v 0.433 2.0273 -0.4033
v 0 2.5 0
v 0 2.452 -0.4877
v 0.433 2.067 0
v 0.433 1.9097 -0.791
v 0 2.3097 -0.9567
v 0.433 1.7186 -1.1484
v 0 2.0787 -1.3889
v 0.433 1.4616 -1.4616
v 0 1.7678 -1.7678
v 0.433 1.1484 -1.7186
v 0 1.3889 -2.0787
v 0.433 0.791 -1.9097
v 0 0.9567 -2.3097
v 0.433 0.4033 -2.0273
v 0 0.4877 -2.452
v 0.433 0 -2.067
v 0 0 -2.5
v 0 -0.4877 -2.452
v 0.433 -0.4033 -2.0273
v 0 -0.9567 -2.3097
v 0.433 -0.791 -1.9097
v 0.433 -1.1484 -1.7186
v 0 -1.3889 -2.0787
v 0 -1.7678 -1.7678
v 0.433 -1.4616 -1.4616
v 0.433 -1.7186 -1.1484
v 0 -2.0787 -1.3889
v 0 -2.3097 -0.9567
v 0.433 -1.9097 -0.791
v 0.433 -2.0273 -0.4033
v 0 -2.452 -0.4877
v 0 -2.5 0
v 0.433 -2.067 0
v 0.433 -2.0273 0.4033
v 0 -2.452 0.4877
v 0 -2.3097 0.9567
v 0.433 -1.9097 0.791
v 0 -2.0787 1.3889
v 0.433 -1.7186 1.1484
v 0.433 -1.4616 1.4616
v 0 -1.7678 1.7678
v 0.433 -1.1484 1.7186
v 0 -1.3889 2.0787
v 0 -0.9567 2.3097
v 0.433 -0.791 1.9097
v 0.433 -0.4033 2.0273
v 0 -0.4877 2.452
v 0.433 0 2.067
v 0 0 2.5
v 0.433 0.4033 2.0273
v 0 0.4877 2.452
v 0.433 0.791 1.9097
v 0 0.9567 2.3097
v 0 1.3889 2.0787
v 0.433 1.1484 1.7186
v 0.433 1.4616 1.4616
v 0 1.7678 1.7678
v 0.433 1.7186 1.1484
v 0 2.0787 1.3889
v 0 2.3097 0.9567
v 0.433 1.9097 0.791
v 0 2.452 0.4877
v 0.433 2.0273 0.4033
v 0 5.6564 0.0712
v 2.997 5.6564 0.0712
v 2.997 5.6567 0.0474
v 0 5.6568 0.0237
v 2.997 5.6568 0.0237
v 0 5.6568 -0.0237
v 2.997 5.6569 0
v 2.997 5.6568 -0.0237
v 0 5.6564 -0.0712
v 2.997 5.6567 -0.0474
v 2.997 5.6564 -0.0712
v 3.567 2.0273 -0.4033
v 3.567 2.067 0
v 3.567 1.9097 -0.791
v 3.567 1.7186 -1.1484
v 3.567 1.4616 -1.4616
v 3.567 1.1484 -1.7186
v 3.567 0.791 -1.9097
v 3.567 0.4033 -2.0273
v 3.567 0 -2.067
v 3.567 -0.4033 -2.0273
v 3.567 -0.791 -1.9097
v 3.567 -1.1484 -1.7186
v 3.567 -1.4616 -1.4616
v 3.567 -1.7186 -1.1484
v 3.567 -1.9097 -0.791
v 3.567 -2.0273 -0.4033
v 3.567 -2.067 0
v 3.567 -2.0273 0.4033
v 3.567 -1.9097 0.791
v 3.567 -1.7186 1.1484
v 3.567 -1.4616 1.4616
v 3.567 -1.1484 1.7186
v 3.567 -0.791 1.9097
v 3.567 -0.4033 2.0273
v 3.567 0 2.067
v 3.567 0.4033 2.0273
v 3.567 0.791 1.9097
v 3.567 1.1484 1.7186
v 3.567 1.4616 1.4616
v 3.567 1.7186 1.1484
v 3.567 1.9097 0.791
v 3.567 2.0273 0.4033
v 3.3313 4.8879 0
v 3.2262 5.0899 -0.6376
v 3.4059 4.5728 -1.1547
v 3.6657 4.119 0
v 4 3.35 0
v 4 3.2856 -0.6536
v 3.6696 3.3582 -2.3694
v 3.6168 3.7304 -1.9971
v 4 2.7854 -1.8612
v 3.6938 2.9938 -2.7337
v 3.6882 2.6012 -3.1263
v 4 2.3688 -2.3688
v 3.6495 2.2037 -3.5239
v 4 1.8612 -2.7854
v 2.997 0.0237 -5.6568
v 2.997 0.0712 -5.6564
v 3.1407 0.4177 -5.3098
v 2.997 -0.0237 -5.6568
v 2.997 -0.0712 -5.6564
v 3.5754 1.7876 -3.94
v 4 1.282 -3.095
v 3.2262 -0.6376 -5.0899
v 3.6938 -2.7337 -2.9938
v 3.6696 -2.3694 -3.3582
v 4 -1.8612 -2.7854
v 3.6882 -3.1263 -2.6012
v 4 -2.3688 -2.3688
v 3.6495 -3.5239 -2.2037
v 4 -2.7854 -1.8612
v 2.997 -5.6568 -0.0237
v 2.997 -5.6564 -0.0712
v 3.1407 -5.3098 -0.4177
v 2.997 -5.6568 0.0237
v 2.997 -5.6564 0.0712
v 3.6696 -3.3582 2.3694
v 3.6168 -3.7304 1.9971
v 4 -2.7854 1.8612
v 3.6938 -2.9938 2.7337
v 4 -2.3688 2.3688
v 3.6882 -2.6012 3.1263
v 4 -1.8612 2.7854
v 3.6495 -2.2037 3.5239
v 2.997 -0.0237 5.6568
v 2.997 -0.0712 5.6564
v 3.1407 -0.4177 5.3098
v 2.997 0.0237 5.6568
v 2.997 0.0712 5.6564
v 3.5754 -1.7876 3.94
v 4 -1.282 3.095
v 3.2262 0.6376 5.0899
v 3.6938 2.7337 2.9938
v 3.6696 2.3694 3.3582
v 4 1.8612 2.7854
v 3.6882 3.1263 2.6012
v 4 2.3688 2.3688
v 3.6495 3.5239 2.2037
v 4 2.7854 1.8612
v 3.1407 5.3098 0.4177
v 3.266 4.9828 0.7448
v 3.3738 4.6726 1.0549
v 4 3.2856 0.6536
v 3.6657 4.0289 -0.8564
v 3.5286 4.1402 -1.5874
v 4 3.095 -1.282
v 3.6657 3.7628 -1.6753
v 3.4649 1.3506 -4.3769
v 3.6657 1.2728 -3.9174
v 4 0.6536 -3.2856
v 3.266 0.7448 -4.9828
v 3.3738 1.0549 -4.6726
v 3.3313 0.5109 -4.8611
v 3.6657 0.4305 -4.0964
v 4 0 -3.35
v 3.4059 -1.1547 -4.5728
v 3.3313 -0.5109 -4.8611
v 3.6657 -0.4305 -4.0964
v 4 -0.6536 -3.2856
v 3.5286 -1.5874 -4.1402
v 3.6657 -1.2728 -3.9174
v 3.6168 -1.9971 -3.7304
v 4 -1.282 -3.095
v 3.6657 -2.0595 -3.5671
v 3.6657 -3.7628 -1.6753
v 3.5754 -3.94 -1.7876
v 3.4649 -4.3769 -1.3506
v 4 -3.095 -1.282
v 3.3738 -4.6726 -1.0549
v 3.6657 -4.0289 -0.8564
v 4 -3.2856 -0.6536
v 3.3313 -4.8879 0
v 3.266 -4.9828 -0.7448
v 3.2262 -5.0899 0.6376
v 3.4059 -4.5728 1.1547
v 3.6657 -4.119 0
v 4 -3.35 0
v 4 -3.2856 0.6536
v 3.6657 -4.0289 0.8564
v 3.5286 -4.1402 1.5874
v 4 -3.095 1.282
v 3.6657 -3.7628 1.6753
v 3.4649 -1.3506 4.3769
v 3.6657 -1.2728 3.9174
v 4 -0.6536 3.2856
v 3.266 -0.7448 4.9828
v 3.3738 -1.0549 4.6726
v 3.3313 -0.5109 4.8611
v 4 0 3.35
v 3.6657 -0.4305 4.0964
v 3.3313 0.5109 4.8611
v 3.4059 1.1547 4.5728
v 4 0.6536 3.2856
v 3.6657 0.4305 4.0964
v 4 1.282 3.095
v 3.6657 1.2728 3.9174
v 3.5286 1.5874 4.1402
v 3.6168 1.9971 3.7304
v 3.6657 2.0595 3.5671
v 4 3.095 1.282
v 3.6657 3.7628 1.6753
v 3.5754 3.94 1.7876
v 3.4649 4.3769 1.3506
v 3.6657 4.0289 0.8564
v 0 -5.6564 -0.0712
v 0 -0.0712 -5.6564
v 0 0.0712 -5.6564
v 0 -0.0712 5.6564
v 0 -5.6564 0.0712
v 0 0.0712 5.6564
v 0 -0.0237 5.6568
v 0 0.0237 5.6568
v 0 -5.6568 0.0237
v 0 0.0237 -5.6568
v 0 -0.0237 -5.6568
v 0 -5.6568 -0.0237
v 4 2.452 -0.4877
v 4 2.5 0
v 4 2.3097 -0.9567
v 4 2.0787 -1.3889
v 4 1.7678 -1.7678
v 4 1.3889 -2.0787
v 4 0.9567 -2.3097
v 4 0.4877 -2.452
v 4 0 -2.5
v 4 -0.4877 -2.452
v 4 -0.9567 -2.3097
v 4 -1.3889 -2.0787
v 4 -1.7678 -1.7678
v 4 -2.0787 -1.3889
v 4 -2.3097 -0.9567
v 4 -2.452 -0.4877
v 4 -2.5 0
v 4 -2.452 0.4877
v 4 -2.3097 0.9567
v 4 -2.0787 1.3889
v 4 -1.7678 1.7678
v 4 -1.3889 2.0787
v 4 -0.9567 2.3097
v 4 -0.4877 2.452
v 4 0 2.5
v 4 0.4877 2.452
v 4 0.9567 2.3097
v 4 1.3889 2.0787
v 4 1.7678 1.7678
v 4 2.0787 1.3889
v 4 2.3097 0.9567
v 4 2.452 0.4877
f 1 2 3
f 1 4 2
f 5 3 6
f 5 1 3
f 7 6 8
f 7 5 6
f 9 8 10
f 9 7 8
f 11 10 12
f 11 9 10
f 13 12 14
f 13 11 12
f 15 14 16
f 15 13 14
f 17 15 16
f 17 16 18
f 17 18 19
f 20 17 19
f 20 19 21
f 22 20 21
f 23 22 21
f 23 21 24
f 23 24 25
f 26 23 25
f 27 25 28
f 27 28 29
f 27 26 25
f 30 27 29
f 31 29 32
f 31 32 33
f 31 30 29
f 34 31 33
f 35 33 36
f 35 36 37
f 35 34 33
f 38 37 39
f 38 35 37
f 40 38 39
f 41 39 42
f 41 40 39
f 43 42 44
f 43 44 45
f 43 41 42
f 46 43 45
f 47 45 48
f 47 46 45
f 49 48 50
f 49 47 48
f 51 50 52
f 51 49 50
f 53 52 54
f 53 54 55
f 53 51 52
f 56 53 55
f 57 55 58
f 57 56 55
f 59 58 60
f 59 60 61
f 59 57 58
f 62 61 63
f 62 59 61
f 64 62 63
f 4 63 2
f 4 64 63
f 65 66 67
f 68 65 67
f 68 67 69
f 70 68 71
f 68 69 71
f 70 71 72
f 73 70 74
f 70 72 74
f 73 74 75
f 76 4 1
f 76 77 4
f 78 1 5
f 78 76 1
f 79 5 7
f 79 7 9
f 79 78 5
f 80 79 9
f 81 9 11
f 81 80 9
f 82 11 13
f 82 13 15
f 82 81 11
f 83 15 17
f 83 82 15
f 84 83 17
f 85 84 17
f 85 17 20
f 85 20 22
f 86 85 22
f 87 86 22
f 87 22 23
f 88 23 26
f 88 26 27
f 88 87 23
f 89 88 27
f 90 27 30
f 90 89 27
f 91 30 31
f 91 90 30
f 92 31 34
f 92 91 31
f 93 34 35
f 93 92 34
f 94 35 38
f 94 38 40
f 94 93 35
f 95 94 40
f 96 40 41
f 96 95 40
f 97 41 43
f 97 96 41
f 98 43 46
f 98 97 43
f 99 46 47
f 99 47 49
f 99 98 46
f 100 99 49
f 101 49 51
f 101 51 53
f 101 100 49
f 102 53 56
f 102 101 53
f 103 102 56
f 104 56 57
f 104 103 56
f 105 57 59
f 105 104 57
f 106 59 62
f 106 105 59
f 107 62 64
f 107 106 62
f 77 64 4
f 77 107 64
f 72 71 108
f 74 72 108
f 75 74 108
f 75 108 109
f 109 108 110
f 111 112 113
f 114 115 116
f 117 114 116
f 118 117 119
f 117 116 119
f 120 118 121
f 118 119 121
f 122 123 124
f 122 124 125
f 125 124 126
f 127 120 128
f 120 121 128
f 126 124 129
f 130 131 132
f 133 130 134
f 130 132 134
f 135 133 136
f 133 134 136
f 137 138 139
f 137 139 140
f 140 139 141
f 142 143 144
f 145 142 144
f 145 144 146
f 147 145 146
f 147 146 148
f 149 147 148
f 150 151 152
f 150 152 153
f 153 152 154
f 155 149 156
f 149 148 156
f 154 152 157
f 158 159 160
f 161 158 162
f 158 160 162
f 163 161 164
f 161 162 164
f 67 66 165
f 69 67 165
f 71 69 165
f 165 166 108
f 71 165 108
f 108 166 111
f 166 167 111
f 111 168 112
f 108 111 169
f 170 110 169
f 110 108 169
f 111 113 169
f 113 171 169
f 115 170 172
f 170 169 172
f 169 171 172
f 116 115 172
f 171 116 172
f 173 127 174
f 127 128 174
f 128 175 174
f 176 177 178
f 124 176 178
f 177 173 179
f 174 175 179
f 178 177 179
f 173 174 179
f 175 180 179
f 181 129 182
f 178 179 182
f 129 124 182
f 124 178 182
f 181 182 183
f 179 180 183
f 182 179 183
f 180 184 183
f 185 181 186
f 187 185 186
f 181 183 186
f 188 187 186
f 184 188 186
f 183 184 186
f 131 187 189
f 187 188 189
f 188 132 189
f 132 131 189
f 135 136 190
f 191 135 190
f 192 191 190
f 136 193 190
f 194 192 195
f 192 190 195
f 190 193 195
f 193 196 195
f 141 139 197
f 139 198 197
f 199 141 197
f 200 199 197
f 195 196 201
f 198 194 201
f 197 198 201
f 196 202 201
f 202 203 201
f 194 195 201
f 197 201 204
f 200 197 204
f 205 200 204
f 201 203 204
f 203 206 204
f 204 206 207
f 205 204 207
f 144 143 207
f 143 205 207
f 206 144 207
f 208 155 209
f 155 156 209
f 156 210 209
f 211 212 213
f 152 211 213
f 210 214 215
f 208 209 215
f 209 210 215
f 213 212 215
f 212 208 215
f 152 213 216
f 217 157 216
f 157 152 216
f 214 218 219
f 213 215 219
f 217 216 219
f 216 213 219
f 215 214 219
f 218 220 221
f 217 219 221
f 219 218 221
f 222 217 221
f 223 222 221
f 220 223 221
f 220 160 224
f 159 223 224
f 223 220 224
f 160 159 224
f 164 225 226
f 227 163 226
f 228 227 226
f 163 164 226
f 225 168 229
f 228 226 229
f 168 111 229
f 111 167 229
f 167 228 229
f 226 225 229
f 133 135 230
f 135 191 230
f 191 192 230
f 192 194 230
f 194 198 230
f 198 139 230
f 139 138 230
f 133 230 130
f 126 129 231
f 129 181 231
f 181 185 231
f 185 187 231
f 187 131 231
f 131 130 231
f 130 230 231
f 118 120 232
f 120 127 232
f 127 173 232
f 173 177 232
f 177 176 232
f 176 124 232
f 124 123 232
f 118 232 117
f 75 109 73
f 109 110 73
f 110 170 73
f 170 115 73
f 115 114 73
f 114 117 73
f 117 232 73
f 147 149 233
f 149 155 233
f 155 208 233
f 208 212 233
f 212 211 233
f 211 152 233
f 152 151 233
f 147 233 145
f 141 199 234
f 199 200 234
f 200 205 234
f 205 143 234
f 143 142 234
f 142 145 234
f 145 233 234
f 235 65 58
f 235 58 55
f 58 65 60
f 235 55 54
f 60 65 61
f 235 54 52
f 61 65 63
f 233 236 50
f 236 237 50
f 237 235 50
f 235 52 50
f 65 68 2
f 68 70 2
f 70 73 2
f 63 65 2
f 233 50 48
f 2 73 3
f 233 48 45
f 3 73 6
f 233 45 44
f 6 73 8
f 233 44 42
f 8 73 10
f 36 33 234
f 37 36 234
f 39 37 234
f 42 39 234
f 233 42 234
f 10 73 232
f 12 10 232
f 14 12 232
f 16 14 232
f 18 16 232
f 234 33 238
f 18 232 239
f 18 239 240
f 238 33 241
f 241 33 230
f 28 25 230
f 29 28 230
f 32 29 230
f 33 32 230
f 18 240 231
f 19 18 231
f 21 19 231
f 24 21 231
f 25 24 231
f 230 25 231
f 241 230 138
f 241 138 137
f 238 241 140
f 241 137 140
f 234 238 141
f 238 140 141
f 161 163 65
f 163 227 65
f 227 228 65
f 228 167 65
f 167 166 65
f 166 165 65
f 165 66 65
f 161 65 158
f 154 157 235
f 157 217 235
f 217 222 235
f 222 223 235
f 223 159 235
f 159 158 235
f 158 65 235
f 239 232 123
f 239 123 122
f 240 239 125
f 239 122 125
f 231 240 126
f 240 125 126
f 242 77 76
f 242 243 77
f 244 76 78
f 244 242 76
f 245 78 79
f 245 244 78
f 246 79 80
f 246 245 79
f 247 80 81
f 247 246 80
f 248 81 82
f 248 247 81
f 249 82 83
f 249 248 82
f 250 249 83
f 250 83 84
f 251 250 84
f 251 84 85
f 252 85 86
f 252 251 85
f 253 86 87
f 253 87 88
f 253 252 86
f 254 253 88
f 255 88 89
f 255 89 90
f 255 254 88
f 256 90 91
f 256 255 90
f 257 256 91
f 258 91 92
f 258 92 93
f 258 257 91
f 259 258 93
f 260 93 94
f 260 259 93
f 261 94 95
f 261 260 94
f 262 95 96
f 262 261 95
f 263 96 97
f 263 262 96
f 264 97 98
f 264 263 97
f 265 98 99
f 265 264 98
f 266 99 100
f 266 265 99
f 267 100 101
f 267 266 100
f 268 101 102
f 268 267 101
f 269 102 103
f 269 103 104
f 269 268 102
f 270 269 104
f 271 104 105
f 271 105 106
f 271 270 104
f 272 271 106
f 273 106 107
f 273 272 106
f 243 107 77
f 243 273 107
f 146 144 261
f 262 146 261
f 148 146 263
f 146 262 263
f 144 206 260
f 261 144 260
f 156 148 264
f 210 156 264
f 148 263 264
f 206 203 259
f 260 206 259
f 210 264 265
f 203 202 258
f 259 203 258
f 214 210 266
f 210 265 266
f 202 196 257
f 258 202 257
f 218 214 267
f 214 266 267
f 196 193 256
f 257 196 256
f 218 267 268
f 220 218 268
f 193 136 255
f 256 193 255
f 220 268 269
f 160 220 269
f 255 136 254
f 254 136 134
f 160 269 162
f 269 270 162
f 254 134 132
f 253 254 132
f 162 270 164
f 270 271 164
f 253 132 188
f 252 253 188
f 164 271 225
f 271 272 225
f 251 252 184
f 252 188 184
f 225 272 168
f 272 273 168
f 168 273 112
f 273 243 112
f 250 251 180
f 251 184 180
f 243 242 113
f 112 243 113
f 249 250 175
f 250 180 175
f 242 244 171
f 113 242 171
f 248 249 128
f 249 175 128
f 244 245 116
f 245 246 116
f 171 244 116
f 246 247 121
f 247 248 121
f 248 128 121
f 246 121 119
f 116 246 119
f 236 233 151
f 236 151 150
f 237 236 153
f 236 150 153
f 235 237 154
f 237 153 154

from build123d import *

# Parameters (mm, degrees)
SKETCH2_W          = 32
SKETCH2_H          = 32
CUT_EXTRUDE1_DEPTH = 4


with BuildPart() as part:
    # Sketch1 → Revolve1 (revolve)
    with BuildSketch(Plane.XY):
        Polygon((0, 0), (0, 5.656854249), (2.996951225, 5.656854249), (4, 3.35), (4, 0), align=None)
    revolve(axis=Axis((4, 0, 0), (-1, 0, 0)))

    # Sketch2 → Cut-Extrude1 (cut)
    with BuildSketch(Plane(origin=(0, 0, 0), x_dir=(0, 0, -1), z_dir=(1, 0, 0))):
        Rectangle(SKETCH2_W, SKETCH2_H)
        Polygon((-5.727564928, 0), (0, -5.727564928), (5.727564928, 0), (0, 5.727564928), align=None, mode=Mode.SUBTRACT)
    extrude(amount=CUT_EXTRUDE1_DEPTH, mode=Mode.SUBTRACT)

    # Sketch3 → Cut-Revolve1 (revolve, cut)
    with BuildSketch(Plane.XY):
        Polygon((0, 0), (0, 2.5), (0.433, 2.067), (3.567, 2.067), (4, 2.5), (4, 0), align=None)
    revolve(axis=Axis((4, 0, 0), (-1, 0, 0)), mode=Mode.SUBTRACT)


solid = part.part
